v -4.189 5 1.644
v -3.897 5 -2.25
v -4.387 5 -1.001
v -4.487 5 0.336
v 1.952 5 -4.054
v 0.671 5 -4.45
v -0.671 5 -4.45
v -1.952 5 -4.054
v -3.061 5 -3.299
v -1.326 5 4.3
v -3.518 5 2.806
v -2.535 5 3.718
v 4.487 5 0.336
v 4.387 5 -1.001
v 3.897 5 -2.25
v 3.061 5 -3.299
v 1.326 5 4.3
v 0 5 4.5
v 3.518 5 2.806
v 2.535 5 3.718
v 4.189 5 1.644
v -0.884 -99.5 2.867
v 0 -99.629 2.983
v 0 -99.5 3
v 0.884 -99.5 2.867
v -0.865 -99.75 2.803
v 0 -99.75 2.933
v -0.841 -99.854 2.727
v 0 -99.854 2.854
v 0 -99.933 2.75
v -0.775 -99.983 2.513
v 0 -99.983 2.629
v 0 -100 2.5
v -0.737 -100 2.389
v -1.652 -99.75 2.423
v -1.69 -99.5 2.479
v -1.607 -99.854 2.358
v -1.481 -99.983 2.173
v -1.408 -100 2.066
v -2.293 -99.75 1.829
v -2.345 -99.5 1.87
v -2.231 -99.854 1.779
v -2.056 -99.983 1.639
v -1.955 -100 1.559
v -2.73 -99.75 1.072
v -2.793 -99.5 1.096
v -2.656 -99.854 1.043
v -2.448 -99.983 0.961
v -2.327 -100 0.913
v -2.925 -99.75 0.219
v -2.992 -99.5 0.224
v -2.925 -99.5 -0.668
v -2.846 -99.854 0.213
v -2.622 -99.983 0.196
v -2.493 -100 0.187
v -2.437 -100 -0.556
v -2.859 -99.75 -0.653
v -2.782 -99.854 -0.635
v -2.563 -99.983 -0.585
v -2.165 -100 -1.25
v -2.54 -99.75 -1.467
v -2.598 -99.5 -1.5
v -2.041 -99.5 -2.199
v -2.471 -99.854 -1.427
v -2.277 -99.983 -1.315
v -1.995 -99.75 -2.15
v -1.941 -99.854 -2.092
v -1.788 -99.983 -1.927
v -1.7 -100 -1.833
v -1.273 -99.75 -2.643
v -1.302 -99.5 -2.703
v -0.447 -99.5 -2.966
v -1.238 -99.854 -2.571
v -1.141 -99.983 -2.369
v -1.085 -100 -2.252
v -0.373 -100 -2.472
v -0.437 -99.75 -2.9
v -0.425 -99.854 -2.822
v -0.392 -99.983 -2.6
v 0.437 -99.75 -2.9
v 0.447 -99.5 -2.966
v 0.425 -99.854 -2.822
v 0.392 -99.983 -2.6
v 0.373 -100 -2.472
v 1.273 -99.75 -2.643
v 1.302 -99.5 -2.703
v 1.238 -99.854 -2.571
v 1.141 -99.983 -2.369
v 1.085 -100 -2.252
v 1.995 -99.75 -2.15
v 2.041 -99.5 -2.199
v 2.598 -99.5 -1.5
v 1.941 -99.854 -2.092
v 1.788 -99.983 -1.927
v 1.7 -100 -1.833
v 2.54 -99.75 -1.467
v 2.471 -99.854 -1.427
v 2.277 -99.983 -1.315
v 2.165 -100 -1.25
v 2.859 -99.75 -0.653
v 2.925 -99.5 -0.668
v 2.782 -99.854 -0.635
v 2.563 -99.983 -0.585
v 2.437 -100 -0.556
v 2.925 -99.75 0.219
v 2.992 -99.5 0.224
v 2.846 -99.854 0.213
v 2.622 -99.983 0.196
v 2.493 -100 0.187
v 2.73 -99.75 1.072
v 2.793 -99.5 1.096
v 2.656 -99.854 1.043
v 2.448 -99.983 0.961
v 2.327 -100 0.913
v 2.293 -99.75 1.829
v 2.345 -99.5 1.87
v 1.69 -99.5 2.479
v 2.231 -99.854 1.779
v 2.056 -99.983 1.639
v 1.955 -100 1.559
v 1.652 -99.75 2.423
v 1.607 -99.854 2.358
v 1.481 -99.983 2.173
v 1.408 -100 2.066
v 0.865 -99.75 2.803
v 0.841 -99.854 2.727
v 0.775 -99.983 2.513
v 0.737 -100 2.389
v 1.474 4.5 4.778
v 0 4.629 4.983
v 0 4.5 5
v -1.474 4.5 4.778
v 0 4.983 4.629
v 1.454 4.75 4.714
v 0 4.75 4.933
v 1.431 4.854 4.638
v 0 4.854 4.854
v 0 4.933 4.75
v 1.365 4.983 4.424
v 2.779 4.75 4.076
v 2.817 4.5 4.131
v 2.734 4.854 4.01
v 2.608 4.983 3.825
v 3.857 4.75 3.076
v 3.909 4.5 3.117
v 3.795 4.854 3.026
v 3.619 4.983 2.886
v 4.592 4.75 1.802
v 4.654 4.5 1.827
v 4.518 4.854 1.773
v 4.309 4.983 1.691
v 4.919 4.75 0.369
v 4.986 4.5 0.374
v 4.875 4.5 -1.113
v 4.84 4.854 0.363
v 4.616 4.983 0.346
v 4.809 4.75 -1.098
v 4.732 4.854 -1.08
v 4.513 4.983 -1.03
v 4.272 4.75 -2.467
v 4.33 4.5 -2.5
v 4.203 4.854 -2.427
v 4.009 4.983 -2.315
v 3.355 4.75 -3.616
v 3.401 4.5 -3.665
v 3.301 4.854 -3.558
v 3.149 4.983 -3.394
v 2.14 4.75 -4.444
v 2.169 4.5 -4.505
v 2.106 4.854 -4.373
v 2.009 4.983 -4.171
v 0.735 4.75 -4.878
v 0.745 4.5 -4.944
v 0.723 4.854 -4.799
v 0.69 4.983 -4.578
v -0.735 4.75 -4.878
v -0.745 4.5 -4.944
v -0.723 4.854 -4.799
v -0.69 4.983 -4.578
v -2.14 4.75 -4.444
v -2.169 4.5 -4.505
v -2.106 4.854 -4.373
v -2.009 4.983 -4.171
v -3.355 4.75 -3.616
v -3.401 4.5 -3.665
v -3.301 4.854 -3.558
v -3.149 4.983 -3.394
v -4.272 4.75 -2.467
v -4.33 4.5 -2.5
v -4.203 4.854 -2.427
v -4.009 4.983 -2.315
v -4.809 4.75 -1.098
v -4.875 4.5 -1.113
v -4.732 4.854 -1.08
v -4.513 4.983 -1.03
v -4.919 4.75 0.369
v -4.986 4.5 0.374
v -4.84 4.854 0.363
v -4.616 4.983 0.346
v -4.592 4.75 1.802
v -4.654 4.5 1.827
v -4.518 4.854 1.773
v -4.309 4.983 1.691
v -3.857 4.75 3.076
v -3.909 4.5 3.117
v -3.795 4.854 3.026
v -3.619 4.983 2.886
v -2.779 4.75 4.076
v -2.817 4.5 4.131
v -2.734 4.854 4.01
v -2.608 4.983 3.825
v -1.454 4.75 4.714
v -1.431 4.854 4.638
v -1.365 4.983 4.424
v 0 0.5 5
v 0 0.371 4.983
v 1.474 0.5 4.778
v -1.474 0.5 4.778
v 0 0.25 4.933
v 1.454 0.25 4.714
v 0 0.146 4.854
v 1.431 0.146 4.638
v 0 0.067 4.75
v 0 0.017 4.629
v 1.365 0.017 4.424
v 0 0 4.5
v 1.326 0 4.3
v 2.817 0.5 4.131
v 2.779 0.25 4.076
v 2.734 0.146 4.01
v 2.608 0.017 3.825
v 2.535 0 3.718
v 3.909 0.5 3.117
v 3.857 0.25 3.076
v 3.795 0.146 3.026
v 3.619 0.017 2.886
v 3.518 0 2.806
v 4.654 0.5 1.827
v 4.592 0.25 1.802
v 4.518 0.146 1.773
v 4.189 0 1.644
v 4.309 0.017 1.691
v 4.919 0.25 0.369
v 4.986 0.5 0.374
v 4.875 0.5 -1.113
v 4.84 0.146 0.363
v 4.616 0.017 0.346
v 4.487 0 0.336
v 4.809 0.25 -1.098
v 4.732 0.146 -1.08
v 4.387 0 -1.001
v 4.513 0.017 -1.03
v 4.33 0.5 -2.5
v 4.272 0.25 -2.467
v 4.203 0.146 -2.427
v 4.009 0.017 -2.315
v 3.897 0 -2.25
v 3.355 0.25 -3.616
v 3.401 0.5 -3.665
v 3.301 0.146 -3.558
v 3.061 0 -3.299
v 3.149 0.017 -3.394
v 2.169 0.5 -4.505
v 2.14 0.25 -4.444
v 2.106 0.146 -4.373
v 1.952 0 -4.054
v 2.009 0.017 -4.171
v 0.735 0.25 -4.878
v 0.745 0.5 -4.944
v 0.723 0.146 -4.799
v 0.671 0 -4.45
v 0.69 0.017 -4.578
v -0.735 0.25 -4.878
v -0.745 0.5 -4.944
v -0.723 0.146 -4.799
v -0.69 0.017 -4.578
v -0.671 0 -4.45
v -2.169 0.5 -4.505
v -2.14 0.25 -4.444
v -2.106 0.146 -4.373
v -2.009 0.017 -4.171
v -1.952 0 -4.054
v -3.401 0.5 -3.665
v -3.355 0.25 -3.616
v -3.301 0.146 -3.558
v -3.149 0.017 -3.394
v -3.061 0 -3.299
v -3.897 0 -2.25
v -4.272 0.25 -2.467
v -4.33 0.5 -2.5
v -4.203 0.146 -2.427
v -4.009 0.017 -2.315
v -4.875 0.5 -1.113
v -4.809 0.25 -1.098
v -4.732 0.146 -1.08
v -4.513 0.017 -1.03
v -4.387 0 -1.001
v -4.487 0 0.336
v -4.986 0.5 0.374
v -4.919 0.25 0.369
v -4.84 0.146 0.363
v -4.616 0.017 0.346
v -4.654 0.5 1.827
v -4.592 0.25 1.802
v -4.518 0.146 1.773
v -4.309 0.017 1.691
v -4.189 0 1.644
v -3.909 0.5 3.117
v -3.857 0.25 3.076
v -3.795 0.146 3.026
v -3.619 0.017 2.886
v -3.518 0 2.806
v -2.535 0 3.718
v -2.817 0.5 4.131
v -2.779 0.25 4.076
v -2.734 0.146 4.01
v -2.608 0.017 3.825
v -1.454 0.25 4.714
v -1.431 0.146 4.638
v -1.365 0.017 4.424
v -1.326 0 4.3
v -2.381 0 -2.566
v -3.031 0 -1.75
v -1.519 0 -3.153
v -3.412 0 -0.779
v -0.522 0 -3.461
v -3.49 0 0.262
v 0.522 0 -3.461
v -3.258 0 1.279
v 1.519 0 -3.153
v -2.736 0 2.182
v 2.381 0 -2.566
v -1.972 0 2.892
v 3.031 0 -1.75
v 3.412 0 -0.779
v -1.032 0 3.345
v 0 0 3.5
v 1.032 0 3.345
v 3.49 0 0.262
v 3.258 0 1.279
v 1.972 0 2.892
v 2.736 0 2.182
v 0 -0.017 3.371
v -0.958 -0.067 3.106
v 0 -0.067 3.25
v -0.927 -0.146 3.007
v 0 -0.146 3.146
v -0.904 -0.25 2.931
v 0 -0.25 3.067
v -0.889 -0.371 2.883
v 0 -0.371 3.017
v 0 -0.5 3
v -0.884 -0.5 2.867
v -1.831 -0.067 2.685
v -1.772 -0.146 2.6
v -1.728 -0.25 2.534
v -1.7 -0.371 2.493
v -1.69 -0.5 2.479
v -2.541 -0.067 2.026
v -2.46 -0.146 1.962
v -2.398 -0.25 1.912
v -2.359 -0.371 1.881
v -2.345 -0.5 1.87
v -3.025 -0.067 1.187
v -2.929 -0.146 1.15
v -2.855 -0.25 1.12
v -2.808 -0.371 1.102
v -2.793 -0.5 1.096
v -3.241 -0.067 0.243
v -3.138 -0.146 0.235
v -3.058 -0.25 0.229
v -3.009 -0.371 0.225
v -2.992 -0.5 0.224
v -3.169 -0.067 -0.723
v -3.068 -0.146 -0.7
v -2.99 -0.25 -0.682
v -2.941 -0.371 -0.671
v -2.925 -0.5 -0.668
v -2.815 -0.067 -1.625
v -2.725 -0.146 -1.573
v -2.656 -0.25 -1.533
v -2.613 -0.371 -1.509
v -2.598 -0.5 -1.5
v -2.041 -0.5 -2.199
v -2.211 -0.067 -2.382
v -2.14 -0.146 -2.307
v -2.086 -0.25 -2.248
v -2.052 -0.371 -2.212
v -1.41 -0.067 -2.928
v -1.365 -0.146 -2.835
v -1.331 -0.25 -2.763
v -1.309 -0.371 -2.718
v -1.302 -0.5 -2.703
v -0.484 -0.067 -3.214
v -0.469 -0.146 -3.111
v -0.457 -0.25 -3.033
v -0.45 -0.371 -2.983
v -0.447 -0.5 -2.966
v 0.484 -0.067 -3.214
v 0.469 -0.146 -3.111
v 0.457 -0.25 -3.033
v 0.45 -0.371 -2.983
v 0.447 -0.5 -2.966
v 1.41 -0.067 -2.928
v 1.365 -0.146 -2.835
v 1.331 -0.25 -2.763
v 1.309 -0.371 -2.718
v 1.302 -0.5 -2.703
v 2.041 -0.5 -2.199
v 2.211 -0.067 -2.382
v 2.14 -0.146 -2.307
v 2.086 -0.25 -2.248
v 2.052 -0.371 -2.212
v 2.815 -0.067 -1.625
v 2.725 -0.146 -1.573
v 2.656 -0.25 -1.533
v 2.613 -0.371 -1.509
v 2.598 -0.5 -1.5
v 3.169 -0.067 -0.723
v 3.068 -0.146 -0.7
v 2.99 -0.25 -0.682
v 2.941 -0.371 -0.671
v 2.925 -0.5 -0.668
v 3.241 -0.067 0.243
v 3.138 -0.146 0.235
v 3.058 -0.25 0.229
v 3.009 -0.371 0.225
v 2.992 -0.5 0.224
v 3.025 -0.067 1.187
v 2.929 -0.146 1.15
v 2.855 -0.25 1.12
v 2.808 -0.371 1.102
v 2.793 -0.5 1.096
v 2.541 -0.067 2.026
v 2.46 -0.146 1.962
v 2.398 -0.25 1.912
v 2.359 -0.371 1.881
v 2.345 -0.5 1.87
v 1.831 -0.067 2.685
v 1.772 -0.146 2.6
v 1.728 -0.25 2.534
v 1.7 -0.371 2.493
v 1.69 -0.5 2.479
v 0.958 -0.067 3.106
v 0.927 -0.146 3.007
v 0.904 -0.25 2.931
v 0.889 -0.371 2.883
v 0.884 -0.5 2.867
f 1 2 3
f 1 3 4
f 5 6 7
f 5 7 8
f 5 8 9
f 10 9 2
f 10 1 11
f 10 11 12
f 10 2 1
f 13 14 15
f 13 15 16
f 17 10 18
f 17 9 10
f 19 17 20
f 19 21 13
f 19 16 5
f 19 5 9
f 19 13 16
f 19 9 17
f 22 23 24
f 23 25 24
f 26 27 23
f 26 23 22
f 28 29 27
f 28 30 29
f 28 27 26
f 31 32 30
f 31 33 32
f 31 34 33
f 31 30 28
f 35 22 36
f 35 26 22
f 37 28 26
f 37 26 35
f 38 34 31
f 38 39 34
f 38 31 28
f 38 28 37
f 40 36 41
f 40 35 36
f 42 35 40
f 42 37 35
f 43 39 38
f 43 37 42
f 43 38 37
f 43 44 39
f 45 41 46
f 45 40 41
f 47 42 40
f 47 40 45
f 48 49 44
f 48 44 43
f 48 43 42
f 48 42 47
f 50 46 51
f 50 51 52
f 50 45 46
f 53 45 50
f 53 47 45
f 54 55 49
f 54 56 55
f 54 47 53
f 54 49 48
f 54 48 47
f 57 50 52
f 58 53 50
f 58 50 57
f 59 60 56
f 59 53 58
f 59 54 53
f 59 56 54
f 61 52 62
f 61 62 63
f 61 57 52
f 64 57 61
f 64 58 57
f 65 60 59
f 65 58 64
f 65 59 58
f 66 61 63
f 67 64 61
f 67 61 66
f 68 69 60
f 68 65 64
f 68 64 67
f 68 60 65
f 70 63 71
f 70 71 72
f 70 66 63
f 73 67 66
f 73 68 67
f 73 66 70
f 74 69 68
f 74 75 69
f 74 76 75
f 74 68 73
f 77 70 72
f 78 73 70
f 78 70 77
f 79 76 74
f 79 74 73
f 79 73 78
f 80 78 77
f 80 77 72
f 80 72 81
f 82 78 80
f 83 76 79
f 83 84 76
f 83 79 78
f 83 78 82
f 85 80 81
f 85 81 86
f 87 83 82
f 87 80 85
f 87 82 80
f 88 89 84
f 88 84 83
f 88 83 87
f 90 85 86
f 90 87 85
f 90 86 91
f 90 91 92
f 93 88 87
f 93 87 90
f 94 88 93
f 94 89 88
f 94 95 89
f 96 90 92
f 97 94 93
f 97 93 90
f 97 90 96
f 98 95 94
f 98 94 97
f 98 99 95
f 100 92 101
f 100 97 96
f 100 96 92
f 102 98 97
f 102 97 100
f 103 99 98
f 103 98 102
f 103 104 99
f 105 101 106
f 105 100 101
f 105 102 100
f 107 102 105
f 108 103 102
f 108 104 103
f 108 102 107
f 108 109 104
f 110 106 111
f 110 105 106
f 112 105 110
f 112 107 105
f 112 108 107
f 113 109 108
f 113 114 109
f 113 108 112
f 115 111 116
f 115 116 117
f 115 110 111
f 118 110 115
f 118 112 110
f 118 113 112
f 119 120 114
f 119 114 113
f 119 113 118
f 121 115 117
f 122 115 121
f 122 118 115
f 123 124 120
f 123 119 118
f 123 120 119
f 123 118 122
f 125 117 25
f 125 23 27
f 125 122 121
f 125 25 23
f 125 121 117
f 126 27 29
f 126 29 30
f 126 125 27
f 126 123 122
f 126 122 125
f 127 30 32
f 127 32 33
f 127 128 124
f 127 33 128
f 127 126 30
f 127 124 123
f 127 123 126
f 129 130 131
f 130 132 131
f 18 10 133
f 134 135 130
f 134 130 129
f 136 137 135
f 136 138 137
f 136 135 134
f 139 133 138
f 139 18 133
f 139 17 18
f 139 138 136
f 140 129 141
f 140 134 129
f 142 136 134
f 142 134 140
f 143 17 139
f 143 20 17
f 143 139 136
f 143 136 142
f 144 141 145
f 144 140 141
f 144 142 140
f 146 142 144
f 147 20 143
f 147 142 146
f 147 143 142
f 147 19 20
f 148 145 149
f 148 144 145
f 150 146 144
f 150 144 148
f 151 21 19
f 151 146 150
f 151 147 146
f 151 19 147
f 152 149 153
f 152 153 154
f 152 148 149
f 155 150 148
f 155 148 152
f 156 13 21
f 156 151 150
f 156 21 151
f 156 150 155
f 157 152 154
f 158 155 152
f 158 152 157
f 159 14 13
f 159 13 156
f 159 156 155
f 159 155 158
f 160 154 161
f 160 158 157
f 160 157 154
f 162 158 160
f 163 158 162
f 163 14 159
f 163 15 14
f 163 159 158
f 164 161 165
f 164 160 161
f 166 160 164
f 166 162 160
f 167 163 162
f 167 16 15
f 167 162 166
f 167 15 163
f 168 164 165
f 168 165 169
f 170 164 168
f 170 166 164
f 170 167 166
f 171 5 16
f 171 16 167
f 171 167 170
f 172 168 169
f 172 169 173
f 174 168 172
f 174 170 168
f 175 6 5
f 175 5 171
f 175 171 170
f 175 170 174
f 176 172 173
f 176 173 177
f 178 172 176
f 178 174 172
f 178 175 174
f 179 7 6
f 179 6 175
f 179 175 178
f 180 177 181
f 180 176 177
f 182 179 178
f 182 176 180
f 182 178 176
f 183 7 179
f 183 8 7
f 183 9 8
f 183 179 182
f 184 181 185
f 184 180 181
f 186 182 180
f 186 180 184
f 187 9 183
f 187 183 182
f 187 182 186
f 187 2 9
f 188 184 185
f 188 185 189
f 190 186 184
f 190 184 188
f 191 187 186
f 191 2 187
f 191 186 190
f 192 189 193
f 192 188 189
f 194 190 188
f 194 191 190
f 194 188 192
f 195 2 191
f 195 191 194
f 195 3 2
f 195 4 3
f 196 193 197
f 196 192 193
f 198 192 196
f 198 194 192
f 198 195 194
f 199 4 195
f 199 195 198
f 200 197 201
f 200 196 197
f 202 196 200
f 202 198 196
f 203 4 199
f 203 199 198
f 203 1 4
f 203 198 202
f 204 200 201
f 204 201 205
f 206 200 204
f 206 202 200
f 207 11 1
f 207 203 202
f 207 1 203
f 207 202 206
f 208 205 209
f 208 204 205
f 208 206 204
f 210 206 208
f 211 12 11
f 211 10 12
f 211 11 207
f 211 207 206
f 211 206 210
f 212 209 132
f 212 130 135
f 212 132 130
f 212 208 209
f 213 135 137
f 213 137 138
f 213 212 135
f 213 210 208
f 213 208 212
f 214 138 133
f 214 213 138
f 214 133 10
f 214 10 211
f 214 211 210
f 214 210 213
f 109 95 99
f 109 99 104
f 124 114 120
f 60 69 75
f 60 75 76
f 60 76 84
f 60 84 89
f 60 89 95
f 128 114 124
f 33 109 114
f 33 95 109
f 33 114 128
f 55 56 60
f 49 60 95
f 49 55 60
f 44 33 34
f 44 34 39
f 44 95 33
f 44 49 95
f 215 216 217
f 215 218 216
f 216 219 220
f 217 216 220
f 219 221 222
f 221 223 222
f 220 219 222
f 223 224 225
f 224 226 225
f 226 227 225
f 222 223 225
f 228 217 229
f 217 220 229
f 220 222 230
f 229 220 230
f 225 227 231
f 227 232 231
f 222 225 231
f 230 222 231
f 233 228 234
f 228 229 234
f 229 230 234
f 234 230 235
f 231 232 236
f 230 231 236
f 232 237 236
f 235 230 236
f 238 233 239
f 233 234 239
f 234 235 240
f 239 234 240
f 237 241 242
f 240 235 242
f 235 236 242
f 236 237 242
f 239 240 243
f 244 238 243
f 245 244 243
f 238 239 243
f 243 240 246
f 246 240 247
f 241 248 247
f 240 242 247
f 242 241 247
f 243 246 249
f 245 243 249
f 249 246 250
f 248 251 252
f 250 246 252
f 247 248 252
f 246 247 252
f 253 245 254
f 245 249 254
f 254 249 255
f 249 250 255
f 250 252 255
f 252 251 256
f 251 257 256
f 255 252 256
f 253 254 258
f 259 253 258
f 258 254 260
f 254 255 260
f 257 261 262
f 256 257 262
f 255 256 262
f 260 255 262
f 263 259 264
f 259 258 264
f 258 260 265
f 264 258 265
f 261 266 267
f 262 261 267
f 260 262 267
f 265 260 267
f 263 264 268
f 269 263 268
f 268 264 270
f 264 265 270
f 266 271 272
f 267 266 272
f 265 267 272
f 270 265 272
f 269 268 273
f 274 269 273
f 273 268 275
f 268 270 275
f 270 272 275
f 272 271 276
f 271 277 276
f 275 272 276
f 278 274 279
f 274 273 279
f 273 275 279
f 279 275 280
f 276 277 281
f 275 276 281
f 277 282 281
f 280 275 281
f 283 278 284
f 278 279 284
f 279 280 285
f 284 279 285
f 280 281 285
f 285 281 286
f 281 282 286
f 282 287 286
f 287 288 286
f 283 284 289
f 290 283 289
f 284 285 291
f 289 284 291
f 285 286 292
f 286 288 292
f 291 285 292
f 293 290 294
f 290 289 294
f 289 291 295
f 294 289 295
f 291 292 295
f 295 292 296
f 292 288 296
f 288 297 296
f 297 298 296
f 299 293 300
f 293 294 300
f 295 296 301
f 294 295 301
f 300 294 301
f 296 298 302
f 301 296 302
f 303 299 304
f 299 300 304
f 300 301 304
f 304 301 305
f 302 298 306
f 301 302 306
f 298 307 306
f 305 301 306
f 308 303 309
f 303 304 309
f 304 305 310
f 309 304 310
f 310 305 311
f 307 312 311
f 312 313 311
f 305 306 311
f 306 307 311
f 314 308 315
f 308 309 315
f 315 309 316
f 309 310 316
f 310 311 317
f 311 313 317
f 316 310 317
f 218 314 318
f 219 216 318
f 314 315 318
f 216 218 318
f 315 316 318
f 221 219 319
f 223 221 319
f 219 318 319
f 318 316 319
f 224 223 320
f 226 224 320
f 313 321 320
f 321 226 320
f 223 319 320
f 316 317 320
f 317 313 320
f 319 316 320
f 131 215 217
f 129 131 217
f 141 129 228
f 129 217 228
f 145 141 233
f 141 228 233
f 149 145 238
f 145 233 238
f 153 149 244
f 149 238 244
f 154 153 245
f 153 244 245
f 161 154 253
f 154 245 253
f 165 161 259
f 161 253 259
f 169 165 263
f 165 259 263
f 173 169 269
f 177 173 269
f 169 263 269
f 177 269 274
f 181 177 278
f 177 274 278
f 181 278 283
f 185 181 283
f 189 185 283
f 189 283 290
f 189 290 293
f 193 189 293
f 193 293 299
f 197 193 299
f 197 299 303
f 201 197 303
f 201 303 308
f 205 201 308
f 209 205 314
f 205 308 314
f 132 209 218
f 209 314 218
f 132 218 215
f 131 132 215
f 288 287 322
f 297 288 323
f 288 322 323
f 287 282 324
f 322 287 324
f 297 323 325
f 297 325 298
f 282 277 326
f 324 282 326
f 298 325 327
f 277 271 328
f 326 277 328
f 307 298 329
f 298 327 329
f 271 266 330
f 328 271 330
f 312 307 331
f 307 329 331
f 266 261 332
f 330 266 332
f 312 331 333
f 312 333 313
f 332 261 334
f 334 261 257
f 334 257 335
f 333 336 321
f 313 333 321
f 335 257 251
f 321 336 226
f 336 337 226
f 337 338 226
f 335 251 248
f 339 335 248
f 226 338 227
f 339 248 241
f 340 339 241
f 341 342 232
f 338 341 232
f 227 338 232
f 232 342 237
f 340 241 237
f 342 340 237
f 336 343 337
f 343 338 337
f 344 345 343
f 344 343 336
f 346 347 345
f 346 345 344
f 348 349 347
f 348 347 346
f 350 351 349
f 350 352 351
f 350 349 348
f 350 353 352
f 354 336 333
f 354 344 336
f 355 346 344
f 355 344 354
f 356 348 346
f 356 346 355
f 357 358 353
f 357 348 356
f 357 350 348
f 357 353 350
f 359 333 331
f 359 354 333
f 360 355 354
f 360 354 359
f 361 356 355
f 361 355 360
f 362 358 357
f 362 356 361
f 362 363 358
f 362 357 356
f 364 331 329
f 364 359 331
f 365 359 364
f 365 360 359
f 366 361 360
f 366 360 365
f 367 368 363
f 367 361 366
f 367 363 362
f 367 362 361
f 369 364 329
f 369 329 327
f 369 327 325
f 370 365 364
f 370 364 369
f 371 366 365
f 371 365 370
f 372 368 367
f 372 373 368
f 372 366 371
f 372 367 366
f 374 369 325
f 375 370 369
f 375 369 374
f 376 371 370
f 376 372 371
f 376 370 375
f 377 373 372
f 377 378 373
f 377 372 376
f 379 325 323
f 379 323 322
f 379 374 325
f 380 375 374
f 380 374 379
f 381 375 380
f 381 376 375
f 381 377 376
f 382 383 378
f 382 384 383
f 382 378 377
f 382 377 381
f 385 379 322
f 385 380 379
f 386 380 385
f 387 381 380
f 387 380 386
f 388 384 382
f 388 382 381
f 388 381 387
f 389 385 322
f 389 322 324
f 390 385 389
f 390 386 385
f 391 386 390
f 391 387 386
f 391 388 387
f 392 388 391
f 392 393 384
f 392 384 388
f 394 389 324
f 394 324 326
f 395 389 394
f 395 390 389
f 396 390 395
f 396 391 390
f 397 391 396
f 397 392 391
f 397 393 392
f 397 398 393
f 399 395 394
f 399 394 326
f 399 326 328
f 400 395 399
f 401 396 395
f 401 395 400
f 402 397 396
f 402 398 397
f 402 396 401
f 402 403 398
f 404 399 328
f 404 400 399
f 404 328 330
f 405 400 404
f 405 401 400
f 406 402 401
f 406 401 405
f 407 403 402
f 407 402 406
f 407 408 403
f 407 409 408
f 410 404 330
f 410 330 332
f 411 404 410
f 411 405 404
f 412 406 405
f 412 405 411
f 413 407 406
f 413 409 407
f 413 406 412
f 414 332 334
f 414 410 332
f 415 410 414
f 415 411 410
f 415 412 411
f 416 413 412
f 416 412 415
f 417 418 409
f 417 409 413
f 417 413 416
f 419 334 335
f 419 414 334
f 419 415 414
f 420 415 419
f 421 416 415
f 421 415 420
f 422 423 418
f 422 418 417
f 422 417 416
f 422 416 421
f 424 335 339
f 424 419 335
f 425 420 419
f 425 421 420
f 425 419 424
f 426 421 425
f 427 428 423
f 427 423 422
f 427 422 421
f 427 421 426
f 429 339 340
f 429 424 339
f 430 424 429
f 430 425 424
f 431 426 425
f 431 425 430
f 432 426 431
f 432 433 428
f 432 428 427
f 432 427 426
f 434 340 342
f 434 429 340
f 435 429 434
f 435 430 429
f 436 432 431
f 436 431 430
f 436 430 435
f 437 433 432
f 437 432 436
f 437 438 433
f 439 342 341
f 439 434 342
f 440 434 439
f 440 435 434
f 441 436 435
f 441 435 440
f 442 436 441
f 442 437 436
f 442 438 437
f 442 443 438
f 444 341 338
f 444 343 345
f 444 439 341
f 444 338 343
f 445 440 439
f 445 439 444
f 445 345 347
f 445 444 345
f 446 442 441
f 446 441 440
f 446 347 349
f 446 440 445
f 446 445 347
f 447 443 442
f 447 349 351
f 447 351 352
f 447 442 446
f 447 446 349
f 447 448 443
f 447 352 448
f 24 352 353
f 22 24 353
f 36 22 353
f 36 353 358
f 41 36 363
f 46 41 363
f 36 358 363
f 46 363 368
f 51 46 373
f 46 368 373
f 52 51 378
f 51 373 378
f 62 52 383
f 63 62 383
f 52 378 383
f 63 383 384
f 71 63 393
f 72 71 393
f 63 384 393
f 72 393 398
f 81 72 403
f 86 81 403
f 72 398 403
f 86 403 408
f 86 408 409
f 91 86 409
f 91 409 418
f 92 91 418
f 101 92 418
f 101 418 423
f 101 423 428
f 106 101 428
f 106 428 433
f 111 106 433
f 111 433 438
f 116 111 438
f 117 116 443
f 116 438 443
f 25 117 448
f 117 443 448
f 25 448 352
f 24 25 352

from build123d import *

# Parameters (mm, degrees)
SKETCH_1_R      = 5
EXTRUDE_1_DEPTH = 5
SKETCH_2_R      = 3
EXTRUDE_2_DEPTH = 100
FILLET_1_R      = 0.5


with BuildPart() as part:
    # 草圖1 → 伸長1 (new body)
    with BuildSketch(Plane(origin=(0, 0, 0), x_dir=(1, 0, 0), z_dir=(0, 1, 0))):
        with Locations(Location((0, 0, 0), (0, 0, 270))):
            Circle(SKETCH_1_R)
    extrude(amount=EXTRUDE_1_DEPTH)

    # 草圖2 → 伸長2 (add)
    with BuildSketch(Plane.XZ):
        with Locations(Location((0, 0, 0), (0, 0, 90))):
            Circle(SKETCH_2_R)
    extrude(amount=EXTRUDE_2_DEPTH)

    # 圓角1
    fillet_1_edges = [part.edges().sort_by_distance(p)[0] for p in [
        (0, 0, -5),
        (0, 5, -5),
        (0, 0, -3),
        (0, -100, -3),
    ]]
    fillet(fillet_1_edges, radius=FILLET_1_R)


solid = part.part
